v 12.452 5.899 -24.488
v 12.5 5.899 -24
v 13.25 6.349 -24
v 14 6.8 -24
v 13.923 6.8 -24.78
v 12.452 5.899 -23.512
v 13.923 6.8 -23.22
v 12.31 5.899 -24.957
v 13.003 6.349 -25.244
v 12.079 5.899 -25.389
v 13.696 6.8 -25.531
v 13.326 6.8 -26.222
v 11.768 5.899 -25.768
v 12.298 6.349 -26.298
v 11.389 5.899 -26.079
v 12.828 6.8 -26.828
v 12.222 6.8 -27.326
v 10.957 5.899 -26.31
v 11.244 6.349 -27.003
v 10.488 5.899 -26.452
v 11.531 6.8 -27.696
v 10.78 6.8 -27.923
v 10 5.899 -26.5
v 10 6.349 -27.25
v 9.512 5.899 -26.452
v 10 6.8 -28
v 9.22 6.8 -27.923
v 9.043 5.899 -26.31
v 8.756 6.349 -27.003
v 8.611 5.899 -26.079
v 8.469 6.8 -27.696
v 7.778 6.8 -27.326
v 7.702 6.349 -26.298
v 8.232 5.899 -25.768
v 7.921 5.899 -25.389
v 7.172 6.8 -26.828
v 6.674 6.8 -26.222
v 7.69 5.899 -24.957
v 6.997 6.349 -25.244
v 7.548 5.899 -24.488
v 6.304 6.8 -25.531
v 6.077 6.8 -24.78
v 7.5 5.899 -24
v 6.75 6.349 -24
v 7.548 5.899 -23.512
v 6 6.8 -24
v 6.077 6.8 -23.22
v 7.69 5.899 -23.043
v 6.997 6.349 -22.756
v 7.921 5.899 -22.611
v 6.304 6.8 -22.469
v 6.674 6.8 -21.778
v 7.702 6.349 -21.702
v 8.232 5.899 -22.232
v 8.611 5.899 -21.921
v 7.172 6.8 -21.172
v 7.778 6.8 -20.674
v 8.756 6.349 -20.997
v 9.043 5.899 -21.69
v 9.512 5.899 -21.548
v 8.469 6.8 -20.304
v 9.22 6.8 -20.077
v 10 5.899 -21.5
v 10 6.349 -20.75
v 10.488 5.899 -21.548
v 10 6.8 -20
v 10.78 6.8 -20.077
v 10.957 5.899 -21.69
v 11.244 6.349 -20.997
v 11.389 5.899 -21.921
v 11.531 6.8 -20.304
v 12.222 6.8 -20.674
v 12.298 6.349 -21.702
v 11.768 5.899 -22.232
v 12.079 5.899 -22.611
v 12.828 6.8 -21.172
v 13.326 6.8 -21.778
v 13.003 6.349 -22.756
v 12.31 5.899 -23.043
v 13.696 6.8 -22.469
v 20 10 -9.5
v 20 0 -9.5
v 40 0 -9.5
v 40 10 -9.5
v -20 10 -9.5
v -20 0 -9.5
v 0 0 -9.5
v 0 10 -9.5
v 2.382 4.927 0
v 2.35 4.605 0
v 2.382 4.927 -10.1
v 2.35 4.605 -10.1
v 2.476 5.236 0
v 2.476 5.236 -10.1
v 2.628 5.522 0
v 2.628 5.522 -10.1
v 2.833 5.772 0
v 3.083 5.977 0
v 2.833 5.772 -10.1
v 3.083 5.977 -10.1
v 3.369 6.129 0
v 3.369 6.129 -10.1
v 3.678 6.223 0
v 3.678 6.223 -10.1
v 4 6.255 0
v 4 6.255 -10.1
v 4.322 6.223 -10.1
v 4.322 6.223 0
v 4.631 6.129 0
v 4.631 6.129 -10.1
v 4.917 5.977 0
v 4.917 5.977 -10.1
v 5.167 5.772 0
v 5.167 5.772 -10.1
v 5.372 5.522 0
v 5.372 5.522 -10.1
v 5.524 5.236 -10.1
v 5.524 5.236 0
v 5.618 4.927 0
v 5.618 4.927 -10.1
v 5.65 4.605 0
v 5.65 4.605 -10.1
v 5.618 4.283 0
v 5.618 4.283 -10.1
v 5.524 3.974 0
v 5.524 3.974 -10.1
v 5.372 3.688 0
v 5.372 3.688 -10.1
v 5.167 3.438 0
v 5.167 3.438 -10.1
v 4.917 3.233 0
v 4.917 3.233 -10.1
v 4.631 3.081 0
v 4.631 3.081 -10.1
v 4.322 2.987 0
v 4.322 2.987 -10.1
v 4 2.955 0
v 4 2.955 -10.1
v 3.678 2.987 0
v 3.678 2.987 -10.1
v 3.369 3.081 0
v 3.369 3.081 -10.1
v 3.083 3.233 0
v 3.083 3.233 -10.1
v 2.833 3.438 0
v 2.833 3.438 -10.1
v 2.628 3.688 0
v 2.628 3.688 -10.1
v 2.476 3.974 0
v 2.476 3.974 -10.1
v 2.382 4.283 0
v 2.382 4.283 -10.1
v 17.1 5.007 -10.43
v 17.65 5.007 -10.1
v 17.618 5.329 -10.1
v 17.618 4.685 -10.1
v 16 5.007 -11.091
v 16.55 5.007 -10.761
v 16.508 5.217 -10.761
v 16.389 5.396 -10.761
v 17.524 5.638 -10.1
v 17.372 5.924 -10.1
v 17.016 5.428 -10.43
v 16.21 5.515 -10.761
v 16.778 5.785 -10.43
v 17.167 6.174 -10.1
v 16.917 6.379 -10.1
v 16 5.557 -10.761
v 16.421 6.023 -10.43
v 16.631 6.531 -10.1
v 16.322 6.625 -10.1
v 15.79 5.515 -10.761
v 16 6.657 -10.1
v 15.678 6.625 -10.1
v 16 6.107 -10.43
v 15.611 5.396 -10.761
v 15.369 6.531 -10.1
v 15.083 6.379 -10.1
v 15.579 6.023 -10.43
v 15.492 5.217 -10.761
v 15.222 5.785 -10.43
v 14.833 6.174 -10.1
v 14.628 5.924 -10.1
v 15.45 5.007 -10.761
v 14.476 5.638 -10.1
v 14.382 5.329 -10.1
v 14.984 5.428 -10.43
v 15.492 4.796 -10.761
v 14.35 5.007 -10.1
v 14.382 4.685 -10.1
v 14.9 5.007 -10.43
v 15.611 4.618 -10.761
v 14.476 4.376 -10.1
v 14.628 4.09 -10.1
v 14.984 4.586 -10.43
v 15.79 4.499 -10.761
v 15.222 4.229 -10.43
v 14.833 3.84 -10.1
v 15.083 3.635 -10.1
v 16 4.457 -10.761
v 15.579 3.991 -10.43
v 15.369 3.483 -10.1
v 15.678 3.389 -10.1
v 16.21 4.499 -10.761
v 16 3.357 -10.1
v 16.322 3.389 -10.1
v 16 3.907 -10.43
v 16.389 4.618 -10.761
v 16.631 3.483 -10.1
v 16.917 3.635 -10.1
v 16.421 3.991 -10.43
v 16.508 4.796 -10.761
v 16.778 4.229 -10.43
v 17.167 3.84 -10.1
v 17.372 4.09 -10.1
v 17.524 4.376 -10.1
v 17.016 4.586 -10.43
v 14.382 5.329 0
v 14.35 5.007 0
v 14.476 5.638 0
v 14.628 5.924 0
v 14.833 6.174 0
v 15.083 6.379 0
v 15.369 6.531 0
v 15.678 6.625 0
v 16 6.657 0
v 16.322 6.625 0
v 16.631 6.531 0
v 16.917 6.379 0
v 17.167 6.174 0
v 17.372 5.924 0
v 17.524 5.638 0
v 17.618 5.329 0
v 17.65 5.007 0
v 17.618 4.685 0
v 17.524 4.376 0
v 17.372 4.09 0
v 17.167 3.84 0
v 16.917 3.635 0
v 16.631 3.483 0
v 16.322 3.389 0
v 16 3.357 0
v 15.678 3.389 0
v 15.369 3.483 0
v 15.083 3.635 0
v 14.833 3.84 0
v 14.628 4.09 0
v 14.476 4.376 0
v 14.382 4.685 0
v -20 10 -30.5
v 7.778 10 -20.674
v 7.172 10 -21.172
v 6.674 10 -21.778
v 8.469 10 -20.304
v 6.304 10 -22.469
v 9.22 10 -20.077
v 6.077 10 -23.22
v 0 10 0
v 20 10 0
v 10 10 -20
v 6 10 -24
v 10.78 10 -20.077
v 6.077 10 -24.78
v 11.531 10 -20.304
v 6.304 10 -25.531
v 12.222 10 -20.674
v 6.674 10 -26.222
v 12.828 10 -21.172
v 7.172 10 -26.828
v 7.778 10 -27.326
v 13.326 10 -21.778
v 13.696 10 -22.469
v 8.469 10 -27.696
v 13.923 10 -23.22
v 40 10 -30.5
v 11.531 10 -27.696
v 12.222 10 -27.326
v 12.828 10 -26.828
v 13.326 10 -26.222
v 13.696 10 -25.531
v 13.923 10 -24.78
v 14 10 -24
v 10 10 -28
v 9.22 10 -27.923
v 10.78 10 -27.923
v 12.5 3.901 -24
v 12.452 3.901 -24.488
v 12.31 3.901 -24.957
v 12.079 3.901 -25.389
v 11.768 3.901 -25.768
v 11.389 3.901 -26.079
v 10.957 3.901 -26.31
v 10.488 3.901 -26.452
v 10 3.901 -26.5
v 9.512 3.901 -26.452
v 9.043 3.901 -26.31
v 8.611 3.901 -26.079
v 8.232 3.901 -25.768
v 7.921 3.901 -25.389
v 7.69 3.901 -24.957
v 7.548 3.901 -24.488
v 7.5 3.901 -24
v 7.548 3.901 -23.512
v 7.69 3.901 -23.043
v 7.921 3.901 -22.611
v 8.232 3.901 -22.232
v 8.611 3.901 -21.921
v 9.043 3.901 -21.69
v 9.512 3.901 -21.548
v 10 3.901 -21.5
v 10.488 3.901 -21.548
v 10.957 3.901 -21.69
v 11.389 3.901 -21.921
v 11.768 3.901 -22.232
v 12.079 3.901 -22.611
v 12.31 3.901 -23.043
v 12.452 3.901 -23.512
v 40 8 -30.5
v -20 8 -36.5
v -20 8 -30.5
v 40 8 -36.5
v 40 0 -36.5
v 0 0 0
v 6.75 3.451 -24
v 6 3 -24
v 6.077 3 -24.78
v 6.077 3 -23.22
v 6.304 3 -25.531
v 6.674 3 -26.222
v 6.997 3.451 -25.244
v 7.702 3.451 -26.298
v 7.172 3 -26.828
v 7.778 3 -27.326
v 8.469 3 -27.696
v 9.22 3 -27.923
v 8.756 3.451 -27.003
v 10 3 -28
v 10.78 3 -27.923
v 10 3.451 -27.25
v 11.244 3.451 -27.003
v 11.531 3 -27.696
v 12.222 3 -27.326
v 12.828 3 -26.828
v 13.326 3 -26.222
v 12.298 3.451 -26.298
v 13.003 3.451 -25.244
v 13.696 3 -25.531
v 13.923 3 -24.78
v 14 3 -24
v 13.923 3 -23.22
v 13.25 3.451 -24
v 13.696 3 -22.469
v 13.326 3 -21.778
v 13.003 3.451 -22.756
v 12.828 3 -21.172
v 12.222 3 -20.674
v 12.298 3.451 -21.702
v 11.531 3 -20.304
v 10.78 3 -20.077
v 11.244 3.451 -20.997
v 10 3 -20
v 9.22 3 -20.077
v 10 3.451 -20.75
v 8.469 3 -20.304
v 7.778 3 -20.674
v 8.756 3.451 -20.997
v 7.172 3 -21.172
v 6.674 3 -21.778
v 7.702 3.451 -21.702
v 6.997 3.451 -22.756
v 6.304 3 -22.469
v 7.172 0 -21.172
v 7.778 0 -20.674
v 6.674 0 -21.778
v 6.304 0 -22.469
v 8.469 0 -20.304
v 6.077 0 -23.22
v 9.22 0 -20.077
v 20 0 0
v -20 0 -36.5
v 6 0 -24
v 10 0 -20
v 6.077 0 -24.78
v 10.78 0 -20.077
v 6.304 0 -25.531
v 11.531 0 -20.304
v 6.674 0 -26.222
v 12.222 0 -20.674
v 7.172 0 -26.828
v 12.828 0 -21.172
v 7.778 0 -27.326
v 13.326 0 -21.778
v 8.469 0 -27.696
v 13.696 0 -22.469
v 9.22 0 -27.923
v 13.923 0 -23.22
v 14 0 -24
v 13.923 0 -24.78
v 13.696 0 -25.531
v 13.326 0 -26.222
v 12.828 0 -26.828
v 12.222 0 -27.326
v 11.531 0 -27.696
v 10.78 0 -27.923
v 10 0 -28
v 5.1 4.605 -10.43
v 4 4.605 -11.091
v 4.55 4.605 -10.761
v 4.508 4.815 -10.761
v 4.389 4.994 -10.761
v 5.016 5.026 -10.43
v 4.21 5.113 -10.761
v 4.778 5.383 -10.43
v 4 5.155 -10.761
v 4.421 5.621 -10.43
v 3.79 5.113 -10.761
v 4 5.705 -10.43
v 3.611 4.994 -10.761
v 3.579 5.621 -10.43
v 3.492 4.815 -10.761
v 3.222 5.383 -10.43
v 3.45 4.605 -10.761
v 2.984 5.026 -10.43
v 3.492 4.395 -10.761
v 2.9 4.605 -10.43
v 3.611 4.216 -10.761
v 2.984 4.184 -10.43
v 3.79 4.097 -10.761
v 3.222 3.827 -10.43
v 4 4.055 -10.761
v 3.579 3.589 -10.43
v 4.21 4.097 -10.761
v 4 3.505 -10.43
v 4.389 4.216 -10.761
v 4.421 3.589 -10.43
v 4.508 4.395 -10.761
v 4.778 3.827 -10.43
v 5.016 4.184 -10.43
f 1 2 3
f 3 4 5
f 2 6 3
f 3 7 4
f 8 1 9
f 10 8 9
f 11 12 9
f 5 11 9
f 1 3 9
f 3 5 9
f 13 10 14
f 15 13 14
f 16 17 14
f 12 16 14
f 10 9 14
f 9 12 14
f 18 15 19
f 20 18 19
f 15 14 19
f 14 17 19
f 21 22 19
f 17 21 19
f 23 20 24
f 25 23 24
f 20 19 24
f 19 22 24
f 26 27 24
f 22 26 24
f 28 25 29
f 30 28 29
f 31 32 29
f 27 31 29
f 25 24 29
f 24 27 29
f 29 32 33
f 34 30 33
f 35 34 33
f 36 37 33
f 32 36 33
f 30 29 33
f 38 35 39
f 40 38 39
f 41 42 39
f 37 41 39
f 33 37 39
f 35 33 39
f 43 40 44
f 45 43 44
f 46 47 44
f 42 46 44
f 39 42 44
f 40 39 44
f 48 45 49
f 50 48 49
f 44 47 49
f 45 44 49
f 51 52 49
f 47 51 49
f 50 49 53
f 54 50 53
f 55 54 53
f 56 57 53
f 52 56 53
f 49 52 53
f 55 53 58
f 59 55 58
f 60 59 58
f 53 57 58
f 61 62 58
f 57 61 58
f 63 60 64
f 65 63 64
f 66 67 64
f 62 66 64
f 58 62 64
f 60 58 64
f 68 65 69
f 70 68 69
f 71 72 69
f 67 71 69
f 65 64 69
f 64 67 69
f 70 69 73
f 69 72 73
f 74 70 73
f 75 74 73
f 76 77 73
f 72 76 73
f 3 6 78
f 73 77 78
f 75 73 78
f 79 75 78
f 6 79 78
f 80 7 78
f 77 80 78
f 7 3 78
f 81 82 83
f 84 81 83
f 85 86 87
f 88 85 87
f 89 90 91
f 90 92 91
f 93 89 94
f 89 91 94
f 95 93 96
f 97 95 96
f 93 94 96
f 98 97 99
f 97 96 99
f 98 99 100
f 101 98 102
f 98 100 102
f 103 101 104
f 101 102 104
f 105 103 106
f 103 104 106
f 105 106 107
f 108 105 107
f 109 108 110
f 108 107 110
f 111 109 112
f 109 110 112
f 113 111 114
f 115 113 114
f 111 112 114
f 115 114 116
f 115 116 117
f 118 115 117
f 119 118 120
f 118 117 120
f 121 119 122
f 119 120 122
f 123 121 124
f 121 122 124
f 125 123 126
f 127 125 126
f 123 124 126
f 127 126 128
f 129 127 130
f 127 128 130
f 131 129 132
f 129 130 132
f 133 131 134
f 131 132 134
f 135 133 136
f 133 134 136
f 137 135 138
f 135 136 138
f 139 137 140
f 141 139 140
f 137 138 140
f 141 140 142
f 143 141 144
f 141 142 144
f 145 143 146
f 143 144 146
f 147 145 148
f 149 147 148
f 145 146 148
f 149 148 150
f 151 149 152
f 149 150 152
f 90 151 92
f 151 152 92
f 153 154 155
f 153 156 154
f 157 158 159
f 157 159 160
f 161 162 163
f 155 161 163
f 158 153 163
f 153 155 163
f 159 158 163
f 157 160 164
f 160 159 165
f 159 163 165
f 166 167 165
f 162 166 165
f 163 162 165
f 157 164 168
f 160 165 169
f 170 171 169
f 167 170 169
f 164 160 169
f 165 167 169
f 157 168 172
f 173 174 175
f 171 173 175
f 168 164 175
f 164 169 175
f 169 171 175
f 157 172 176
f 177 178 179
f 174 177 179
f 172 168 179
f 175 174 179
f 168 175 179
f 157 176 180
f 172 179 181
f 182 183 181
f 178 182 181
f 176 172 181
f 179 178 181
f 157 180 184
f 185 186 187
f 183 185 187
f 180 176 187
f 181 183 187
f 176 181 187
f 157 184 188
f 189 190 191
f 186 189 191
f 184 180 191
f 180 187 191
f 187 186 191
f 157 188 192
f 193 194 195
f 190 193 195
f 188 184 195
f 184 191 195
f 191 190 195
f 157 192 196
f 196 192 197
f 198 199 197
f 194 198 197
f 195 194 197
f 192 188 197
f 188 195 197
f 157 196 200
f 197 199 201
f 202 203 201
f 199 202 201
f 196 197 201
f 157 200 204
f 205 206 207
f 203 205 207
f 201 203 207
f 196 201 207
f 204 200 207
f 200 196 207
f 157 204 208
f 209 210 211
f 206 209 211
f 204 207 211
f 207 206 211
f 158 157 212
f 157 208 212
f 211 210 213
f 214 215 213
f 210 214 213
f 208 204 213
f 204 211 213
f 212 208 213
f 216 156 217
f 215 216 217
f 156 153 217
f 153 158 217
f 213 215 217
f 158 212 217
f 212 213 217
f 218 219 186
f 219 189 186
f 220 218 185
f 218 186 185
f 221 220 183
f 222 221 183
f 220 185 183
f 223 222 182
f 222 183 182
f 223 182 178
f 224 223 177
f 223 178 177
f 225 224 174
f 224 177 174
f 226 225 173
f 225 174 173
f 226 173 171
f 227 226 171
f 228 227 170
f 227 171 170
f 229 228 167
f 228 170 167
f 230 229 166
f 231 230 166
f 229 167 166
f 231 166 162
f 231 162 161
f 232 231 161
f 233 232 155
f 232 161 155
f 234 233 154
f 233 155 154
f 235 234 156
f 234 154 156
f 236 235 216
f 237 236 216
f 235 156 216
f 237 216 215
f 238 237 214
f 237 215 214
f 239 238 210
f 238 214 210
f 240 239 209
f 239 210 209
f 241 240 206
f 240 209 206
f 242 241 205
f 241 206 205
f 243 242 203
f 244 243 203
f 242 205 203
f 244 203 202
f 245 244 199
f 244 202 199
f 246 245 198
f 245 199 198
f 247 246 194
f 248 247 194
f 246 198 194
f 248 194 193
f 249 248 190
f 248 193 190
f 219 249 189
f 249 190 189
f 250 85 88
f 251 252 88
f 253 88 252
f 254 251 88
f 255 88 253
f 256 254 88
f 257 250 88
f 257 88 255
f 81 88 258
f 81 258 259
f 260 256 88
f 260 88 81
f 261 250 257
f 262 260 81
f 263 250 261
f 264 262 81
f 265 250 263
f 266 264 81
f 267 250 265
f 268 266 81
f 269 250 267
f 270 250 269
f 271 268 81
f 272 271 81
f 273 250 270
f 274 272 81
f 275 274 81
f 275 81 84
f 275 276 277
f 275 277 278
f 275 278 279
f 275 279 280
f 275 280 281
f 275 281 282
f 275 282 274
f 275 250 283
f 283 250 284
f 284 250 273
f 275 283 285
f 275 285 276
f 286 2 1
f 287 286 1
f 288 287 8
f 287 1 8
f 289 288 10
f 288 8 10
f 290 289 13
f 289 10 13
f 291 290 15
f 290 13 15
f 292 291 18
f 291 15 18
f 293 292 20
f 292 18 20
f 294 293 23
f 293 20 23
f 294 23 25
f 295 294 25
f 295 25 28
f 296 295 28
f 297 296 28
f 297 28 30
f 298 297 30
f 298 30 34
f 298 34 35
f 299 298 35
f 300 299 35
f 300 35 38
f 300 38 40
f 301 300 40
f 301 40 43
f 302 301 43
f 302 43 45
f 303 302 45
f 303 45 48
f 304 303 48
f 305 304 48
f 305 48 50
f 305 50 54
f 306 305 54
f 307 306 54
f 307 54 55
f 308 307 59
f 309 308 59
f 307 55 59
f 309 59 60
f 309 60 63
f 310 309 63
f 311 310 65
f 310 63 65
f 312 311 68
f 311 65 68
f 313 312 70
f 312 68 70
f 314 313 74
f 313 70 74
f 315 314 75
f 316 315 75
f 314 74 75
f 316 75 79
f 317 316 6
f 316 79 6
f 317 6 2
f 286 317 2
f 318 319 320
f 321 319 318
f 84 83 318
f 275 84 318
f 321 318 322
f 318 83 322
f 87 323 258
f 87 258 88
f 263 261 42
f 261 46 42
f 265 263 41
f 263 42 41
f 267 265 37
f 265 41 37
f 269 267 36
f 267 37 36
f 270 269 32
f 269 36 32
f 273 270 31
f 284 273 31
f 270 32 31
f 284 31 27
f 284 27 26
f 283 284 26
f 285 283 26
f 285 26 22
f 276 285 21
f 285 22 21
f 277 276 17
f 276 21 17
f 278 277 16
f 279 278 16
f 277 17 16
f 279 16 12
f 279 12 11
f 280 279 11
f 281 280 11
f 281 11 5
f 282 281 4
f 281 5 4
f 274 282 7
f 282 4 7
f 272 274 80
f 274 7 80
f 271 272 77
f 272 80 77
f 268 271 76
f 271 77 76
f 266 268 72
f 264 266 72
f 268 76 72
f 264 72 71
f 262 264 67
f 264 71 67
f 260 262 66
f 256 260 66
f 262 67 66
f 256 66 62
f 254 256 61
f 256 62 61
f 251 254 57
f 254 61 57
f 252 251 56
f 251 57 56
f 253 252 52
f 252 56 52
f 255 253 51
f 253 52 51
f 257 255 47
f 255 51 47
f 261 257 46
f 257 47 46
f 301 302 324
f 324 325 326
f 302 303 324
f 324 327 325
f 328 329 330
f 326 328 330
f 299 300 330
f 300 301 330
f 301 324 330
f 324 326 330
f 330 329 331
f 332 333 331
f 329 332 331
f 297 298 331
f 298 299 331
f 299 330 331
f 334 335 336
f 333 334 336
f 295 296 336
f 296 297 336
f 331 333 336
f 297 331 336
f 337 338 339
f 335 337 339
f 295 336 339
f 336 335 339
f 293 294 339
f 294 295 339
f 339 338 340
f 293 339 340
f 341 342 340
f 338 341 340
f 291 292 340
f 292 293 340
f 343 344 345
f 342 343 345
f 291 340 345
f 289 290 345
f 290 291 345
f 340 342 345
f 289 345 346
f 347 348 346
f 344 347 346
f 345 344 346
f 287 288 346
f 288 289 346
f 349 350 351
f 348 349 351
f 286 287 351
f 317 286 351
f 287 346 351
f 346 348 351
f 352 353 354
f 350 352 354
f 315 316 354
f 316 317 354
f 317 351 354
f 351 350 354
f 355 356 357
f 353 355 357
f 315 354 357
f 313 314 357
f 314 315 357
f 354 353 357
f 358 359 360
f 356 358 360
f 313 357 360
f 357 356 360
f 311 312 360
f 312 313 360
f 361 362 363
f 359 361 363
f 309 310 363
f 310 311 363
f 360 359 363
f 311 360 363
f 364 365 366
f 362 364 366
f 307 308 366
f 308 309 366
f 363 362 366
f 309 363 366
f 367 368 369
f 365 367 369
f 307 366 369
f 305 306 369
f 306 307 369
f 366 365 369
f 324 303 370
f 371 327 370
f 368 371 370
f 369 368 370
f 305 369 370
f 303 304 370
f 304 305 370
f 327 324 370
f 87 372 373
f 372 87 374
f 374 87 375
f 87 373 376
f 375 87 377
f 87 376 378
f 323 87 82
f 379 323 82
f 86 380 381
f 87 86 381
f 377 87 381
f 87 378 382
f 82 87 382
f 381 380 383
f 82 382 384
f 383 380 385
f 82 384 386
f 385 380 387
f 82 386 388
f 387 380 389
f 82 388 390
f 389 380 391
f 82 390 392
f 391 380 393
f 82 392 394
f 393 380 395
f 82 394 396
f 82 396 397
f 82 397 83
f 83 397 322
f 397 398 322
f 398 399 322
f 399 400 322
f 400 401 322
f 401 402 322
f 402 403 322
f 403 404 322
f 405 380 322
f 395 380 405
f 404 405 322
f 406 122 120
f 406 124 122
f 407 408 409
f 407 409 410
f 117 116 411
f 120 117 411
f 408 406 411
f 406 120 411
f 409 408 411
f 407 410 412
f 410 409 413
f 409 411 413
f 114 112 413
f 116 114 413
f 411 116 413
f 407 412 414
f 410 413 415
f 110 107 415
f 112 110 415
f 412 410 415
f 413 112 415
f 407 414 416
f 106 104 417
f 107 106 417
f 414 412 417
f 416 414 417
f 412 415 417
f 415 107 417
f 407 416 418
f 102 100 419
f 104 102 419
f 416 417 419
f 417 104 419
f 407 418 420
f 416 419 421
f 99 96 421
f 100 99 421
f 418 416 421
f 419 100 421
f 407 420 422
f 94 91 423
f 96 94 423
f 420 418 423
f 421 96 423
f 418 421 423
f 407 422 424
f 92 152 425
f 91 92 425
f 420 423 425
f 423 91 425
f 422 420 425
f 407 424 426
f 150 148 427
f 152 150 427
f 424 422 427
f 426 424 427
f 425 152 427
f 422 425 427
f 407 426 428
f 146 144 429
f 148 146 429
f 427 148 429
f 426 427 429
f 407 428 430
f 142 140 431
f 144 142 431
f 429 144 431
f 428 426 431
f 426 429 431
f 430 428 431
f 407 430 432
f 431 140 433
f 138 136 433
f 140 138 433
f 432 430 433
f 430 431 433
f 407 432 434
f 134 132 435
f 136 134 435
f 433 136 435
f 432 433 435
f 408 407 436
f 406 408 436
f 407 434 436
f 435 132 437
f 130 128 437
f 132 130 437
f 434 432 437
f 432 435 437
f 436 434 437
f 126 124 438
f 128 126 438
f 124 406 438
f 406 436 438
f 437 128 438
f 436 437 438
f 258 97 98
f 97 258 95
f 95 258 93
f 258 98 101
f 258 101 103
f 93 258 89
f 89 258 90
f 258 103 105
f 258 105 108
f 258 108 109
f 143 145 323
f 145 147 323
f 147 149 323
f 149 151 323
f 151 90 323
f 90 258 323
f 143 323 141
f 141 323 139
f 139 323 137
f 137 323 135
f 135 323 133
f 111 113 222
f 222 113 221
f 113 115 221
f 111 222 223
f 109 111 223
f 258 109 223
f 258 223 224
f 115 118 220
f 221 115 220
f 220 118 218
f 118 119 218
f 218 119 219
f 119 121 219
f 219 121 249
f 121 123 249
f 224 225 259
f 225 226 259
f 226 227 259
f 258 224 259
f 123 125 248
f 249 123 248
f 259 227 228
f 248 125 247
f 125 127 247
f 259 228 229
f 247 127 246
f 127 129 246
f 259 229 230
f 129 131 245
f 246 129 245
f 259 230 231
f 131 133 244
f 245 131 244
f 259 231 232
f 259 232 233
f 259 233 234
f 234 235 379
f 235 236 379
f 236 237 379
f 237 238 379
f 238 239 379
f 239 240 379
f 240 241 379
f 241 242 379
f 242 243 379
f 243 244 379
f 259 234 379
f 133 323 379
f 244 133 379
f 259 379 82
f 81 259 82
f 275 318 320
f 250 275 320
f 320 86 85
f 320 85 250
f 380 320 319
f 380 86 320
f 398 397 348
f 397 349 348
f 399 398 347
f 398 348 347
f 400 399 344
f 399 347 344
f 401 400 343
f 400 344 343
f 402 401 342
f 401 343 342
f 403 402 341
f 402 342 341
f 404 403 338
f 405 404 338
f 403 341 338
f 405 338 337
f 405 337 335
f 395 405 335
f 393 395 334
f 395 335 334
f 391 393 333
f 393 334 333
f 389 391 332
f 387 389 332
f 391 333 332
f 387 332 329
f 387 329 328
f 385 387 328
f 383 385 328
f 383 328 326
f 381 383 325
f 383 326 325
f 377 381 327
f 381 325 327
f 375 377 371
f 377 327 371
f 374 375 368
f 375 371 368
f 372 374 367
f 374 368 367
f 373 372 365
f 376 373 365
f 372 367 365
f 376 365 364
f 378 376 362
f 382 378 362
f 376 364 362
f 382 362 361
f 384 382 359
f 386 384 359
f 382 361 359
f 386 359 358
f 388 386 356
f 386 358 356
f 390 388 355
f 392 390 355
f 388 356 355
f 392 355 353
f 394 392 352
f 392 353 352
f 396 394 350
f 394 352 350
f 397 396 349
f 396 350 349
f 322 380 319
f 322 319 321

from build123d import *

# Parameters (mm, degrees)
BOSS_EXTRUDE5_DEPTH                 = 10
SKETCH2_8_W                         = 60
SKETCH2_8_H                         = 6
BOSS_EXTRUDE6_DEPTH                 = 8
F_8_0MM_CLEARANCE_DOWEL_HOLE1_D     = 8
F_8_0MM_CLEARANCE_DOWEL_HOLE1_DEPTH = 3.2
F_8_0MM_CLEARANCE_DOWEL_HOLE1_TIP   = 2.403442476
F_8_0MM_CLEARANCE_DOWEL_HOLE2_D     = 8
F_8_0MM_CLEARANCE_DOWEL_HOLE2_DEPTH = 3
F_8_0MM_CLEARANCE_DOWEL_HOLE2_TIP   = 2.403442476
F_5_0MM_CLEARANCE_DOWEL_HOLE5_D     = 5
M4_TAPPED_HOLE1_D                   = 3.3
M4_TAPPED_HOLE1_DEPTH               = 10.1
M4_TAPPED_HOLE1_TIP                 = 0.991420021
M4_TAPPED_HOLE2_D                   = 3.3
M4_TAPPED_HOLE2_DEPTH               = 10.1
M4_TAPPED_HOLE2_TIP                 = 0.991420021


with BuildPart() as part:
    # Sketch2 → Boss-Extrude5 (new body)
    with BuildSketch(Plane(origin=(0, 0, 0), x_dir=(1, 0, 0), z_dir=(0, 1, 0))):
        Polygon((40, 30.5), (-20, 30.5), (-20, 9.5), (0, 9.5), (0, 0), (20, 0), (20, 9.5), (40, 9.5), align=None)
    extrude(amount=BOSS_EXTRUDE5_DEPTH)

    # Sketch2<8> → Boss-Extrude6 (add)
    with BuildSketch(Plane(origin=(0, 0, 0), x_dir=(1, 0, 0), z_dir=(0, 1, 0))):
        with Locations((10, 33.5)):
            Rectangle(SKETCH2_8_W, SKETCH2_8_H)
    extrude(amount=BOSS_EXTRUDE6_DEPTH)

    # Ø8.0mm Clearance Dowel Hole1
    with Locations(Plane(origin=(0, 10, 0), x_dir=(1, 0, 0), z_dir=(0, 1, 0))):
        with Locations((10, 24)):
            Hole(F_8_0MM_CLEARANCE_DOWEL_HOLE1_D / 2, depth=F_8_0MM_CLEARANCE_DOWEL_HOLE1_DEPTH)
            with Locations((0, 0, -(F_8_0MM_CLEARANCE_DOWEL_HOLE1_DEPTH + F_8_0MM_CLEARANCE_DOWEL_HOLE1_TIP / 2))):  # 118° drill point
                Cone(0, F_8_0MM_CLEARANCE_DOWEL_HOLE1_D / 2, F_8_0MM_CLEARANCE_DOWEL_HOLE1_TIP, mode=Mode.SUBTRACT)

    # Ø8.0mm Clearance Dowel Hole2
    with Locations(Plane(origin=(0, 0, 0), x_dir=(-1, 0, 0), z_dir=(0, -1, 0))):
        with Locations((-10, 24)):
            Hole(F_8_0MM_CLEARANCE_DOWEL_HOLE2_D / 2, depth=F_8_0MM_CLEARANCE_DOWEL_HOLE2_DEPTH)
            with Locations((0, 0, -(F_8_0MM_CLEARANCE_DOWEL_HOLE2_DEPTH + F_8_0MM_CLEARANCE_DOWEL_HOLE2_TIP / 2))):  # 118° drill point
                Cone(0, F_8_0MM_CLEARANCE_DOWEL_HOLE2_D / 2, F_8_0MM_CLEARANCE_DOWEL_HOLE2_TIP, mode=Mode.SUBTRACT)

    # Ø5.0mm Clearance Dowel Hole5 (through all)
    with Locations(Plane(origin=(0, 0, 0), x_dir=(-1, 0, 0), z_dir=(0, -1, 0))):
        with Locations((-10, 24)):
            Hole(F_5_0MM_CLEARANCE_DOWEL_HOLE5_D / 2)

    # M4 Tapped Hole1
    with Locations(Plane.XY):
        with Locations((4, 4.604977991)):
            Hole(M4_TAPPED_HOLE1_D / 2, depth=M4_TAPPED_HOLE1_DEPTH)
            with Locations((0, 0, -(M4_TAPPED_HOLE1_DEPTH + M4_TAPPED_HOLE1_TIP / 2))):  # 118° drill point
                Cone(0, M4_TAPPED_HOLE1_D / 2, M4_TAPPED_HOLE1_TIP, mode=Mode.SUBTRACT)

    # M4 Tapped Hole2
    with Locations(Plane.XY):
        with Locations((16, 5.006947279)):
            Hole(M4_TAPPED_HOLE2_D / 2, depth=M4_TAPPED_HOLE2_DEPTH)
            with Locations((0, 0, -(M4_TAPPED_HOLE2_DEPTH + M4_TAPPED_HOLE2_TIP / 2))):  # 118° drill point
                Cone(0, M4_TAPPED_HOLE2_D / 2, M4_TAPPED_HOLE2_TIP, mode=Mode.SUBTRACT)


solid = part.part
